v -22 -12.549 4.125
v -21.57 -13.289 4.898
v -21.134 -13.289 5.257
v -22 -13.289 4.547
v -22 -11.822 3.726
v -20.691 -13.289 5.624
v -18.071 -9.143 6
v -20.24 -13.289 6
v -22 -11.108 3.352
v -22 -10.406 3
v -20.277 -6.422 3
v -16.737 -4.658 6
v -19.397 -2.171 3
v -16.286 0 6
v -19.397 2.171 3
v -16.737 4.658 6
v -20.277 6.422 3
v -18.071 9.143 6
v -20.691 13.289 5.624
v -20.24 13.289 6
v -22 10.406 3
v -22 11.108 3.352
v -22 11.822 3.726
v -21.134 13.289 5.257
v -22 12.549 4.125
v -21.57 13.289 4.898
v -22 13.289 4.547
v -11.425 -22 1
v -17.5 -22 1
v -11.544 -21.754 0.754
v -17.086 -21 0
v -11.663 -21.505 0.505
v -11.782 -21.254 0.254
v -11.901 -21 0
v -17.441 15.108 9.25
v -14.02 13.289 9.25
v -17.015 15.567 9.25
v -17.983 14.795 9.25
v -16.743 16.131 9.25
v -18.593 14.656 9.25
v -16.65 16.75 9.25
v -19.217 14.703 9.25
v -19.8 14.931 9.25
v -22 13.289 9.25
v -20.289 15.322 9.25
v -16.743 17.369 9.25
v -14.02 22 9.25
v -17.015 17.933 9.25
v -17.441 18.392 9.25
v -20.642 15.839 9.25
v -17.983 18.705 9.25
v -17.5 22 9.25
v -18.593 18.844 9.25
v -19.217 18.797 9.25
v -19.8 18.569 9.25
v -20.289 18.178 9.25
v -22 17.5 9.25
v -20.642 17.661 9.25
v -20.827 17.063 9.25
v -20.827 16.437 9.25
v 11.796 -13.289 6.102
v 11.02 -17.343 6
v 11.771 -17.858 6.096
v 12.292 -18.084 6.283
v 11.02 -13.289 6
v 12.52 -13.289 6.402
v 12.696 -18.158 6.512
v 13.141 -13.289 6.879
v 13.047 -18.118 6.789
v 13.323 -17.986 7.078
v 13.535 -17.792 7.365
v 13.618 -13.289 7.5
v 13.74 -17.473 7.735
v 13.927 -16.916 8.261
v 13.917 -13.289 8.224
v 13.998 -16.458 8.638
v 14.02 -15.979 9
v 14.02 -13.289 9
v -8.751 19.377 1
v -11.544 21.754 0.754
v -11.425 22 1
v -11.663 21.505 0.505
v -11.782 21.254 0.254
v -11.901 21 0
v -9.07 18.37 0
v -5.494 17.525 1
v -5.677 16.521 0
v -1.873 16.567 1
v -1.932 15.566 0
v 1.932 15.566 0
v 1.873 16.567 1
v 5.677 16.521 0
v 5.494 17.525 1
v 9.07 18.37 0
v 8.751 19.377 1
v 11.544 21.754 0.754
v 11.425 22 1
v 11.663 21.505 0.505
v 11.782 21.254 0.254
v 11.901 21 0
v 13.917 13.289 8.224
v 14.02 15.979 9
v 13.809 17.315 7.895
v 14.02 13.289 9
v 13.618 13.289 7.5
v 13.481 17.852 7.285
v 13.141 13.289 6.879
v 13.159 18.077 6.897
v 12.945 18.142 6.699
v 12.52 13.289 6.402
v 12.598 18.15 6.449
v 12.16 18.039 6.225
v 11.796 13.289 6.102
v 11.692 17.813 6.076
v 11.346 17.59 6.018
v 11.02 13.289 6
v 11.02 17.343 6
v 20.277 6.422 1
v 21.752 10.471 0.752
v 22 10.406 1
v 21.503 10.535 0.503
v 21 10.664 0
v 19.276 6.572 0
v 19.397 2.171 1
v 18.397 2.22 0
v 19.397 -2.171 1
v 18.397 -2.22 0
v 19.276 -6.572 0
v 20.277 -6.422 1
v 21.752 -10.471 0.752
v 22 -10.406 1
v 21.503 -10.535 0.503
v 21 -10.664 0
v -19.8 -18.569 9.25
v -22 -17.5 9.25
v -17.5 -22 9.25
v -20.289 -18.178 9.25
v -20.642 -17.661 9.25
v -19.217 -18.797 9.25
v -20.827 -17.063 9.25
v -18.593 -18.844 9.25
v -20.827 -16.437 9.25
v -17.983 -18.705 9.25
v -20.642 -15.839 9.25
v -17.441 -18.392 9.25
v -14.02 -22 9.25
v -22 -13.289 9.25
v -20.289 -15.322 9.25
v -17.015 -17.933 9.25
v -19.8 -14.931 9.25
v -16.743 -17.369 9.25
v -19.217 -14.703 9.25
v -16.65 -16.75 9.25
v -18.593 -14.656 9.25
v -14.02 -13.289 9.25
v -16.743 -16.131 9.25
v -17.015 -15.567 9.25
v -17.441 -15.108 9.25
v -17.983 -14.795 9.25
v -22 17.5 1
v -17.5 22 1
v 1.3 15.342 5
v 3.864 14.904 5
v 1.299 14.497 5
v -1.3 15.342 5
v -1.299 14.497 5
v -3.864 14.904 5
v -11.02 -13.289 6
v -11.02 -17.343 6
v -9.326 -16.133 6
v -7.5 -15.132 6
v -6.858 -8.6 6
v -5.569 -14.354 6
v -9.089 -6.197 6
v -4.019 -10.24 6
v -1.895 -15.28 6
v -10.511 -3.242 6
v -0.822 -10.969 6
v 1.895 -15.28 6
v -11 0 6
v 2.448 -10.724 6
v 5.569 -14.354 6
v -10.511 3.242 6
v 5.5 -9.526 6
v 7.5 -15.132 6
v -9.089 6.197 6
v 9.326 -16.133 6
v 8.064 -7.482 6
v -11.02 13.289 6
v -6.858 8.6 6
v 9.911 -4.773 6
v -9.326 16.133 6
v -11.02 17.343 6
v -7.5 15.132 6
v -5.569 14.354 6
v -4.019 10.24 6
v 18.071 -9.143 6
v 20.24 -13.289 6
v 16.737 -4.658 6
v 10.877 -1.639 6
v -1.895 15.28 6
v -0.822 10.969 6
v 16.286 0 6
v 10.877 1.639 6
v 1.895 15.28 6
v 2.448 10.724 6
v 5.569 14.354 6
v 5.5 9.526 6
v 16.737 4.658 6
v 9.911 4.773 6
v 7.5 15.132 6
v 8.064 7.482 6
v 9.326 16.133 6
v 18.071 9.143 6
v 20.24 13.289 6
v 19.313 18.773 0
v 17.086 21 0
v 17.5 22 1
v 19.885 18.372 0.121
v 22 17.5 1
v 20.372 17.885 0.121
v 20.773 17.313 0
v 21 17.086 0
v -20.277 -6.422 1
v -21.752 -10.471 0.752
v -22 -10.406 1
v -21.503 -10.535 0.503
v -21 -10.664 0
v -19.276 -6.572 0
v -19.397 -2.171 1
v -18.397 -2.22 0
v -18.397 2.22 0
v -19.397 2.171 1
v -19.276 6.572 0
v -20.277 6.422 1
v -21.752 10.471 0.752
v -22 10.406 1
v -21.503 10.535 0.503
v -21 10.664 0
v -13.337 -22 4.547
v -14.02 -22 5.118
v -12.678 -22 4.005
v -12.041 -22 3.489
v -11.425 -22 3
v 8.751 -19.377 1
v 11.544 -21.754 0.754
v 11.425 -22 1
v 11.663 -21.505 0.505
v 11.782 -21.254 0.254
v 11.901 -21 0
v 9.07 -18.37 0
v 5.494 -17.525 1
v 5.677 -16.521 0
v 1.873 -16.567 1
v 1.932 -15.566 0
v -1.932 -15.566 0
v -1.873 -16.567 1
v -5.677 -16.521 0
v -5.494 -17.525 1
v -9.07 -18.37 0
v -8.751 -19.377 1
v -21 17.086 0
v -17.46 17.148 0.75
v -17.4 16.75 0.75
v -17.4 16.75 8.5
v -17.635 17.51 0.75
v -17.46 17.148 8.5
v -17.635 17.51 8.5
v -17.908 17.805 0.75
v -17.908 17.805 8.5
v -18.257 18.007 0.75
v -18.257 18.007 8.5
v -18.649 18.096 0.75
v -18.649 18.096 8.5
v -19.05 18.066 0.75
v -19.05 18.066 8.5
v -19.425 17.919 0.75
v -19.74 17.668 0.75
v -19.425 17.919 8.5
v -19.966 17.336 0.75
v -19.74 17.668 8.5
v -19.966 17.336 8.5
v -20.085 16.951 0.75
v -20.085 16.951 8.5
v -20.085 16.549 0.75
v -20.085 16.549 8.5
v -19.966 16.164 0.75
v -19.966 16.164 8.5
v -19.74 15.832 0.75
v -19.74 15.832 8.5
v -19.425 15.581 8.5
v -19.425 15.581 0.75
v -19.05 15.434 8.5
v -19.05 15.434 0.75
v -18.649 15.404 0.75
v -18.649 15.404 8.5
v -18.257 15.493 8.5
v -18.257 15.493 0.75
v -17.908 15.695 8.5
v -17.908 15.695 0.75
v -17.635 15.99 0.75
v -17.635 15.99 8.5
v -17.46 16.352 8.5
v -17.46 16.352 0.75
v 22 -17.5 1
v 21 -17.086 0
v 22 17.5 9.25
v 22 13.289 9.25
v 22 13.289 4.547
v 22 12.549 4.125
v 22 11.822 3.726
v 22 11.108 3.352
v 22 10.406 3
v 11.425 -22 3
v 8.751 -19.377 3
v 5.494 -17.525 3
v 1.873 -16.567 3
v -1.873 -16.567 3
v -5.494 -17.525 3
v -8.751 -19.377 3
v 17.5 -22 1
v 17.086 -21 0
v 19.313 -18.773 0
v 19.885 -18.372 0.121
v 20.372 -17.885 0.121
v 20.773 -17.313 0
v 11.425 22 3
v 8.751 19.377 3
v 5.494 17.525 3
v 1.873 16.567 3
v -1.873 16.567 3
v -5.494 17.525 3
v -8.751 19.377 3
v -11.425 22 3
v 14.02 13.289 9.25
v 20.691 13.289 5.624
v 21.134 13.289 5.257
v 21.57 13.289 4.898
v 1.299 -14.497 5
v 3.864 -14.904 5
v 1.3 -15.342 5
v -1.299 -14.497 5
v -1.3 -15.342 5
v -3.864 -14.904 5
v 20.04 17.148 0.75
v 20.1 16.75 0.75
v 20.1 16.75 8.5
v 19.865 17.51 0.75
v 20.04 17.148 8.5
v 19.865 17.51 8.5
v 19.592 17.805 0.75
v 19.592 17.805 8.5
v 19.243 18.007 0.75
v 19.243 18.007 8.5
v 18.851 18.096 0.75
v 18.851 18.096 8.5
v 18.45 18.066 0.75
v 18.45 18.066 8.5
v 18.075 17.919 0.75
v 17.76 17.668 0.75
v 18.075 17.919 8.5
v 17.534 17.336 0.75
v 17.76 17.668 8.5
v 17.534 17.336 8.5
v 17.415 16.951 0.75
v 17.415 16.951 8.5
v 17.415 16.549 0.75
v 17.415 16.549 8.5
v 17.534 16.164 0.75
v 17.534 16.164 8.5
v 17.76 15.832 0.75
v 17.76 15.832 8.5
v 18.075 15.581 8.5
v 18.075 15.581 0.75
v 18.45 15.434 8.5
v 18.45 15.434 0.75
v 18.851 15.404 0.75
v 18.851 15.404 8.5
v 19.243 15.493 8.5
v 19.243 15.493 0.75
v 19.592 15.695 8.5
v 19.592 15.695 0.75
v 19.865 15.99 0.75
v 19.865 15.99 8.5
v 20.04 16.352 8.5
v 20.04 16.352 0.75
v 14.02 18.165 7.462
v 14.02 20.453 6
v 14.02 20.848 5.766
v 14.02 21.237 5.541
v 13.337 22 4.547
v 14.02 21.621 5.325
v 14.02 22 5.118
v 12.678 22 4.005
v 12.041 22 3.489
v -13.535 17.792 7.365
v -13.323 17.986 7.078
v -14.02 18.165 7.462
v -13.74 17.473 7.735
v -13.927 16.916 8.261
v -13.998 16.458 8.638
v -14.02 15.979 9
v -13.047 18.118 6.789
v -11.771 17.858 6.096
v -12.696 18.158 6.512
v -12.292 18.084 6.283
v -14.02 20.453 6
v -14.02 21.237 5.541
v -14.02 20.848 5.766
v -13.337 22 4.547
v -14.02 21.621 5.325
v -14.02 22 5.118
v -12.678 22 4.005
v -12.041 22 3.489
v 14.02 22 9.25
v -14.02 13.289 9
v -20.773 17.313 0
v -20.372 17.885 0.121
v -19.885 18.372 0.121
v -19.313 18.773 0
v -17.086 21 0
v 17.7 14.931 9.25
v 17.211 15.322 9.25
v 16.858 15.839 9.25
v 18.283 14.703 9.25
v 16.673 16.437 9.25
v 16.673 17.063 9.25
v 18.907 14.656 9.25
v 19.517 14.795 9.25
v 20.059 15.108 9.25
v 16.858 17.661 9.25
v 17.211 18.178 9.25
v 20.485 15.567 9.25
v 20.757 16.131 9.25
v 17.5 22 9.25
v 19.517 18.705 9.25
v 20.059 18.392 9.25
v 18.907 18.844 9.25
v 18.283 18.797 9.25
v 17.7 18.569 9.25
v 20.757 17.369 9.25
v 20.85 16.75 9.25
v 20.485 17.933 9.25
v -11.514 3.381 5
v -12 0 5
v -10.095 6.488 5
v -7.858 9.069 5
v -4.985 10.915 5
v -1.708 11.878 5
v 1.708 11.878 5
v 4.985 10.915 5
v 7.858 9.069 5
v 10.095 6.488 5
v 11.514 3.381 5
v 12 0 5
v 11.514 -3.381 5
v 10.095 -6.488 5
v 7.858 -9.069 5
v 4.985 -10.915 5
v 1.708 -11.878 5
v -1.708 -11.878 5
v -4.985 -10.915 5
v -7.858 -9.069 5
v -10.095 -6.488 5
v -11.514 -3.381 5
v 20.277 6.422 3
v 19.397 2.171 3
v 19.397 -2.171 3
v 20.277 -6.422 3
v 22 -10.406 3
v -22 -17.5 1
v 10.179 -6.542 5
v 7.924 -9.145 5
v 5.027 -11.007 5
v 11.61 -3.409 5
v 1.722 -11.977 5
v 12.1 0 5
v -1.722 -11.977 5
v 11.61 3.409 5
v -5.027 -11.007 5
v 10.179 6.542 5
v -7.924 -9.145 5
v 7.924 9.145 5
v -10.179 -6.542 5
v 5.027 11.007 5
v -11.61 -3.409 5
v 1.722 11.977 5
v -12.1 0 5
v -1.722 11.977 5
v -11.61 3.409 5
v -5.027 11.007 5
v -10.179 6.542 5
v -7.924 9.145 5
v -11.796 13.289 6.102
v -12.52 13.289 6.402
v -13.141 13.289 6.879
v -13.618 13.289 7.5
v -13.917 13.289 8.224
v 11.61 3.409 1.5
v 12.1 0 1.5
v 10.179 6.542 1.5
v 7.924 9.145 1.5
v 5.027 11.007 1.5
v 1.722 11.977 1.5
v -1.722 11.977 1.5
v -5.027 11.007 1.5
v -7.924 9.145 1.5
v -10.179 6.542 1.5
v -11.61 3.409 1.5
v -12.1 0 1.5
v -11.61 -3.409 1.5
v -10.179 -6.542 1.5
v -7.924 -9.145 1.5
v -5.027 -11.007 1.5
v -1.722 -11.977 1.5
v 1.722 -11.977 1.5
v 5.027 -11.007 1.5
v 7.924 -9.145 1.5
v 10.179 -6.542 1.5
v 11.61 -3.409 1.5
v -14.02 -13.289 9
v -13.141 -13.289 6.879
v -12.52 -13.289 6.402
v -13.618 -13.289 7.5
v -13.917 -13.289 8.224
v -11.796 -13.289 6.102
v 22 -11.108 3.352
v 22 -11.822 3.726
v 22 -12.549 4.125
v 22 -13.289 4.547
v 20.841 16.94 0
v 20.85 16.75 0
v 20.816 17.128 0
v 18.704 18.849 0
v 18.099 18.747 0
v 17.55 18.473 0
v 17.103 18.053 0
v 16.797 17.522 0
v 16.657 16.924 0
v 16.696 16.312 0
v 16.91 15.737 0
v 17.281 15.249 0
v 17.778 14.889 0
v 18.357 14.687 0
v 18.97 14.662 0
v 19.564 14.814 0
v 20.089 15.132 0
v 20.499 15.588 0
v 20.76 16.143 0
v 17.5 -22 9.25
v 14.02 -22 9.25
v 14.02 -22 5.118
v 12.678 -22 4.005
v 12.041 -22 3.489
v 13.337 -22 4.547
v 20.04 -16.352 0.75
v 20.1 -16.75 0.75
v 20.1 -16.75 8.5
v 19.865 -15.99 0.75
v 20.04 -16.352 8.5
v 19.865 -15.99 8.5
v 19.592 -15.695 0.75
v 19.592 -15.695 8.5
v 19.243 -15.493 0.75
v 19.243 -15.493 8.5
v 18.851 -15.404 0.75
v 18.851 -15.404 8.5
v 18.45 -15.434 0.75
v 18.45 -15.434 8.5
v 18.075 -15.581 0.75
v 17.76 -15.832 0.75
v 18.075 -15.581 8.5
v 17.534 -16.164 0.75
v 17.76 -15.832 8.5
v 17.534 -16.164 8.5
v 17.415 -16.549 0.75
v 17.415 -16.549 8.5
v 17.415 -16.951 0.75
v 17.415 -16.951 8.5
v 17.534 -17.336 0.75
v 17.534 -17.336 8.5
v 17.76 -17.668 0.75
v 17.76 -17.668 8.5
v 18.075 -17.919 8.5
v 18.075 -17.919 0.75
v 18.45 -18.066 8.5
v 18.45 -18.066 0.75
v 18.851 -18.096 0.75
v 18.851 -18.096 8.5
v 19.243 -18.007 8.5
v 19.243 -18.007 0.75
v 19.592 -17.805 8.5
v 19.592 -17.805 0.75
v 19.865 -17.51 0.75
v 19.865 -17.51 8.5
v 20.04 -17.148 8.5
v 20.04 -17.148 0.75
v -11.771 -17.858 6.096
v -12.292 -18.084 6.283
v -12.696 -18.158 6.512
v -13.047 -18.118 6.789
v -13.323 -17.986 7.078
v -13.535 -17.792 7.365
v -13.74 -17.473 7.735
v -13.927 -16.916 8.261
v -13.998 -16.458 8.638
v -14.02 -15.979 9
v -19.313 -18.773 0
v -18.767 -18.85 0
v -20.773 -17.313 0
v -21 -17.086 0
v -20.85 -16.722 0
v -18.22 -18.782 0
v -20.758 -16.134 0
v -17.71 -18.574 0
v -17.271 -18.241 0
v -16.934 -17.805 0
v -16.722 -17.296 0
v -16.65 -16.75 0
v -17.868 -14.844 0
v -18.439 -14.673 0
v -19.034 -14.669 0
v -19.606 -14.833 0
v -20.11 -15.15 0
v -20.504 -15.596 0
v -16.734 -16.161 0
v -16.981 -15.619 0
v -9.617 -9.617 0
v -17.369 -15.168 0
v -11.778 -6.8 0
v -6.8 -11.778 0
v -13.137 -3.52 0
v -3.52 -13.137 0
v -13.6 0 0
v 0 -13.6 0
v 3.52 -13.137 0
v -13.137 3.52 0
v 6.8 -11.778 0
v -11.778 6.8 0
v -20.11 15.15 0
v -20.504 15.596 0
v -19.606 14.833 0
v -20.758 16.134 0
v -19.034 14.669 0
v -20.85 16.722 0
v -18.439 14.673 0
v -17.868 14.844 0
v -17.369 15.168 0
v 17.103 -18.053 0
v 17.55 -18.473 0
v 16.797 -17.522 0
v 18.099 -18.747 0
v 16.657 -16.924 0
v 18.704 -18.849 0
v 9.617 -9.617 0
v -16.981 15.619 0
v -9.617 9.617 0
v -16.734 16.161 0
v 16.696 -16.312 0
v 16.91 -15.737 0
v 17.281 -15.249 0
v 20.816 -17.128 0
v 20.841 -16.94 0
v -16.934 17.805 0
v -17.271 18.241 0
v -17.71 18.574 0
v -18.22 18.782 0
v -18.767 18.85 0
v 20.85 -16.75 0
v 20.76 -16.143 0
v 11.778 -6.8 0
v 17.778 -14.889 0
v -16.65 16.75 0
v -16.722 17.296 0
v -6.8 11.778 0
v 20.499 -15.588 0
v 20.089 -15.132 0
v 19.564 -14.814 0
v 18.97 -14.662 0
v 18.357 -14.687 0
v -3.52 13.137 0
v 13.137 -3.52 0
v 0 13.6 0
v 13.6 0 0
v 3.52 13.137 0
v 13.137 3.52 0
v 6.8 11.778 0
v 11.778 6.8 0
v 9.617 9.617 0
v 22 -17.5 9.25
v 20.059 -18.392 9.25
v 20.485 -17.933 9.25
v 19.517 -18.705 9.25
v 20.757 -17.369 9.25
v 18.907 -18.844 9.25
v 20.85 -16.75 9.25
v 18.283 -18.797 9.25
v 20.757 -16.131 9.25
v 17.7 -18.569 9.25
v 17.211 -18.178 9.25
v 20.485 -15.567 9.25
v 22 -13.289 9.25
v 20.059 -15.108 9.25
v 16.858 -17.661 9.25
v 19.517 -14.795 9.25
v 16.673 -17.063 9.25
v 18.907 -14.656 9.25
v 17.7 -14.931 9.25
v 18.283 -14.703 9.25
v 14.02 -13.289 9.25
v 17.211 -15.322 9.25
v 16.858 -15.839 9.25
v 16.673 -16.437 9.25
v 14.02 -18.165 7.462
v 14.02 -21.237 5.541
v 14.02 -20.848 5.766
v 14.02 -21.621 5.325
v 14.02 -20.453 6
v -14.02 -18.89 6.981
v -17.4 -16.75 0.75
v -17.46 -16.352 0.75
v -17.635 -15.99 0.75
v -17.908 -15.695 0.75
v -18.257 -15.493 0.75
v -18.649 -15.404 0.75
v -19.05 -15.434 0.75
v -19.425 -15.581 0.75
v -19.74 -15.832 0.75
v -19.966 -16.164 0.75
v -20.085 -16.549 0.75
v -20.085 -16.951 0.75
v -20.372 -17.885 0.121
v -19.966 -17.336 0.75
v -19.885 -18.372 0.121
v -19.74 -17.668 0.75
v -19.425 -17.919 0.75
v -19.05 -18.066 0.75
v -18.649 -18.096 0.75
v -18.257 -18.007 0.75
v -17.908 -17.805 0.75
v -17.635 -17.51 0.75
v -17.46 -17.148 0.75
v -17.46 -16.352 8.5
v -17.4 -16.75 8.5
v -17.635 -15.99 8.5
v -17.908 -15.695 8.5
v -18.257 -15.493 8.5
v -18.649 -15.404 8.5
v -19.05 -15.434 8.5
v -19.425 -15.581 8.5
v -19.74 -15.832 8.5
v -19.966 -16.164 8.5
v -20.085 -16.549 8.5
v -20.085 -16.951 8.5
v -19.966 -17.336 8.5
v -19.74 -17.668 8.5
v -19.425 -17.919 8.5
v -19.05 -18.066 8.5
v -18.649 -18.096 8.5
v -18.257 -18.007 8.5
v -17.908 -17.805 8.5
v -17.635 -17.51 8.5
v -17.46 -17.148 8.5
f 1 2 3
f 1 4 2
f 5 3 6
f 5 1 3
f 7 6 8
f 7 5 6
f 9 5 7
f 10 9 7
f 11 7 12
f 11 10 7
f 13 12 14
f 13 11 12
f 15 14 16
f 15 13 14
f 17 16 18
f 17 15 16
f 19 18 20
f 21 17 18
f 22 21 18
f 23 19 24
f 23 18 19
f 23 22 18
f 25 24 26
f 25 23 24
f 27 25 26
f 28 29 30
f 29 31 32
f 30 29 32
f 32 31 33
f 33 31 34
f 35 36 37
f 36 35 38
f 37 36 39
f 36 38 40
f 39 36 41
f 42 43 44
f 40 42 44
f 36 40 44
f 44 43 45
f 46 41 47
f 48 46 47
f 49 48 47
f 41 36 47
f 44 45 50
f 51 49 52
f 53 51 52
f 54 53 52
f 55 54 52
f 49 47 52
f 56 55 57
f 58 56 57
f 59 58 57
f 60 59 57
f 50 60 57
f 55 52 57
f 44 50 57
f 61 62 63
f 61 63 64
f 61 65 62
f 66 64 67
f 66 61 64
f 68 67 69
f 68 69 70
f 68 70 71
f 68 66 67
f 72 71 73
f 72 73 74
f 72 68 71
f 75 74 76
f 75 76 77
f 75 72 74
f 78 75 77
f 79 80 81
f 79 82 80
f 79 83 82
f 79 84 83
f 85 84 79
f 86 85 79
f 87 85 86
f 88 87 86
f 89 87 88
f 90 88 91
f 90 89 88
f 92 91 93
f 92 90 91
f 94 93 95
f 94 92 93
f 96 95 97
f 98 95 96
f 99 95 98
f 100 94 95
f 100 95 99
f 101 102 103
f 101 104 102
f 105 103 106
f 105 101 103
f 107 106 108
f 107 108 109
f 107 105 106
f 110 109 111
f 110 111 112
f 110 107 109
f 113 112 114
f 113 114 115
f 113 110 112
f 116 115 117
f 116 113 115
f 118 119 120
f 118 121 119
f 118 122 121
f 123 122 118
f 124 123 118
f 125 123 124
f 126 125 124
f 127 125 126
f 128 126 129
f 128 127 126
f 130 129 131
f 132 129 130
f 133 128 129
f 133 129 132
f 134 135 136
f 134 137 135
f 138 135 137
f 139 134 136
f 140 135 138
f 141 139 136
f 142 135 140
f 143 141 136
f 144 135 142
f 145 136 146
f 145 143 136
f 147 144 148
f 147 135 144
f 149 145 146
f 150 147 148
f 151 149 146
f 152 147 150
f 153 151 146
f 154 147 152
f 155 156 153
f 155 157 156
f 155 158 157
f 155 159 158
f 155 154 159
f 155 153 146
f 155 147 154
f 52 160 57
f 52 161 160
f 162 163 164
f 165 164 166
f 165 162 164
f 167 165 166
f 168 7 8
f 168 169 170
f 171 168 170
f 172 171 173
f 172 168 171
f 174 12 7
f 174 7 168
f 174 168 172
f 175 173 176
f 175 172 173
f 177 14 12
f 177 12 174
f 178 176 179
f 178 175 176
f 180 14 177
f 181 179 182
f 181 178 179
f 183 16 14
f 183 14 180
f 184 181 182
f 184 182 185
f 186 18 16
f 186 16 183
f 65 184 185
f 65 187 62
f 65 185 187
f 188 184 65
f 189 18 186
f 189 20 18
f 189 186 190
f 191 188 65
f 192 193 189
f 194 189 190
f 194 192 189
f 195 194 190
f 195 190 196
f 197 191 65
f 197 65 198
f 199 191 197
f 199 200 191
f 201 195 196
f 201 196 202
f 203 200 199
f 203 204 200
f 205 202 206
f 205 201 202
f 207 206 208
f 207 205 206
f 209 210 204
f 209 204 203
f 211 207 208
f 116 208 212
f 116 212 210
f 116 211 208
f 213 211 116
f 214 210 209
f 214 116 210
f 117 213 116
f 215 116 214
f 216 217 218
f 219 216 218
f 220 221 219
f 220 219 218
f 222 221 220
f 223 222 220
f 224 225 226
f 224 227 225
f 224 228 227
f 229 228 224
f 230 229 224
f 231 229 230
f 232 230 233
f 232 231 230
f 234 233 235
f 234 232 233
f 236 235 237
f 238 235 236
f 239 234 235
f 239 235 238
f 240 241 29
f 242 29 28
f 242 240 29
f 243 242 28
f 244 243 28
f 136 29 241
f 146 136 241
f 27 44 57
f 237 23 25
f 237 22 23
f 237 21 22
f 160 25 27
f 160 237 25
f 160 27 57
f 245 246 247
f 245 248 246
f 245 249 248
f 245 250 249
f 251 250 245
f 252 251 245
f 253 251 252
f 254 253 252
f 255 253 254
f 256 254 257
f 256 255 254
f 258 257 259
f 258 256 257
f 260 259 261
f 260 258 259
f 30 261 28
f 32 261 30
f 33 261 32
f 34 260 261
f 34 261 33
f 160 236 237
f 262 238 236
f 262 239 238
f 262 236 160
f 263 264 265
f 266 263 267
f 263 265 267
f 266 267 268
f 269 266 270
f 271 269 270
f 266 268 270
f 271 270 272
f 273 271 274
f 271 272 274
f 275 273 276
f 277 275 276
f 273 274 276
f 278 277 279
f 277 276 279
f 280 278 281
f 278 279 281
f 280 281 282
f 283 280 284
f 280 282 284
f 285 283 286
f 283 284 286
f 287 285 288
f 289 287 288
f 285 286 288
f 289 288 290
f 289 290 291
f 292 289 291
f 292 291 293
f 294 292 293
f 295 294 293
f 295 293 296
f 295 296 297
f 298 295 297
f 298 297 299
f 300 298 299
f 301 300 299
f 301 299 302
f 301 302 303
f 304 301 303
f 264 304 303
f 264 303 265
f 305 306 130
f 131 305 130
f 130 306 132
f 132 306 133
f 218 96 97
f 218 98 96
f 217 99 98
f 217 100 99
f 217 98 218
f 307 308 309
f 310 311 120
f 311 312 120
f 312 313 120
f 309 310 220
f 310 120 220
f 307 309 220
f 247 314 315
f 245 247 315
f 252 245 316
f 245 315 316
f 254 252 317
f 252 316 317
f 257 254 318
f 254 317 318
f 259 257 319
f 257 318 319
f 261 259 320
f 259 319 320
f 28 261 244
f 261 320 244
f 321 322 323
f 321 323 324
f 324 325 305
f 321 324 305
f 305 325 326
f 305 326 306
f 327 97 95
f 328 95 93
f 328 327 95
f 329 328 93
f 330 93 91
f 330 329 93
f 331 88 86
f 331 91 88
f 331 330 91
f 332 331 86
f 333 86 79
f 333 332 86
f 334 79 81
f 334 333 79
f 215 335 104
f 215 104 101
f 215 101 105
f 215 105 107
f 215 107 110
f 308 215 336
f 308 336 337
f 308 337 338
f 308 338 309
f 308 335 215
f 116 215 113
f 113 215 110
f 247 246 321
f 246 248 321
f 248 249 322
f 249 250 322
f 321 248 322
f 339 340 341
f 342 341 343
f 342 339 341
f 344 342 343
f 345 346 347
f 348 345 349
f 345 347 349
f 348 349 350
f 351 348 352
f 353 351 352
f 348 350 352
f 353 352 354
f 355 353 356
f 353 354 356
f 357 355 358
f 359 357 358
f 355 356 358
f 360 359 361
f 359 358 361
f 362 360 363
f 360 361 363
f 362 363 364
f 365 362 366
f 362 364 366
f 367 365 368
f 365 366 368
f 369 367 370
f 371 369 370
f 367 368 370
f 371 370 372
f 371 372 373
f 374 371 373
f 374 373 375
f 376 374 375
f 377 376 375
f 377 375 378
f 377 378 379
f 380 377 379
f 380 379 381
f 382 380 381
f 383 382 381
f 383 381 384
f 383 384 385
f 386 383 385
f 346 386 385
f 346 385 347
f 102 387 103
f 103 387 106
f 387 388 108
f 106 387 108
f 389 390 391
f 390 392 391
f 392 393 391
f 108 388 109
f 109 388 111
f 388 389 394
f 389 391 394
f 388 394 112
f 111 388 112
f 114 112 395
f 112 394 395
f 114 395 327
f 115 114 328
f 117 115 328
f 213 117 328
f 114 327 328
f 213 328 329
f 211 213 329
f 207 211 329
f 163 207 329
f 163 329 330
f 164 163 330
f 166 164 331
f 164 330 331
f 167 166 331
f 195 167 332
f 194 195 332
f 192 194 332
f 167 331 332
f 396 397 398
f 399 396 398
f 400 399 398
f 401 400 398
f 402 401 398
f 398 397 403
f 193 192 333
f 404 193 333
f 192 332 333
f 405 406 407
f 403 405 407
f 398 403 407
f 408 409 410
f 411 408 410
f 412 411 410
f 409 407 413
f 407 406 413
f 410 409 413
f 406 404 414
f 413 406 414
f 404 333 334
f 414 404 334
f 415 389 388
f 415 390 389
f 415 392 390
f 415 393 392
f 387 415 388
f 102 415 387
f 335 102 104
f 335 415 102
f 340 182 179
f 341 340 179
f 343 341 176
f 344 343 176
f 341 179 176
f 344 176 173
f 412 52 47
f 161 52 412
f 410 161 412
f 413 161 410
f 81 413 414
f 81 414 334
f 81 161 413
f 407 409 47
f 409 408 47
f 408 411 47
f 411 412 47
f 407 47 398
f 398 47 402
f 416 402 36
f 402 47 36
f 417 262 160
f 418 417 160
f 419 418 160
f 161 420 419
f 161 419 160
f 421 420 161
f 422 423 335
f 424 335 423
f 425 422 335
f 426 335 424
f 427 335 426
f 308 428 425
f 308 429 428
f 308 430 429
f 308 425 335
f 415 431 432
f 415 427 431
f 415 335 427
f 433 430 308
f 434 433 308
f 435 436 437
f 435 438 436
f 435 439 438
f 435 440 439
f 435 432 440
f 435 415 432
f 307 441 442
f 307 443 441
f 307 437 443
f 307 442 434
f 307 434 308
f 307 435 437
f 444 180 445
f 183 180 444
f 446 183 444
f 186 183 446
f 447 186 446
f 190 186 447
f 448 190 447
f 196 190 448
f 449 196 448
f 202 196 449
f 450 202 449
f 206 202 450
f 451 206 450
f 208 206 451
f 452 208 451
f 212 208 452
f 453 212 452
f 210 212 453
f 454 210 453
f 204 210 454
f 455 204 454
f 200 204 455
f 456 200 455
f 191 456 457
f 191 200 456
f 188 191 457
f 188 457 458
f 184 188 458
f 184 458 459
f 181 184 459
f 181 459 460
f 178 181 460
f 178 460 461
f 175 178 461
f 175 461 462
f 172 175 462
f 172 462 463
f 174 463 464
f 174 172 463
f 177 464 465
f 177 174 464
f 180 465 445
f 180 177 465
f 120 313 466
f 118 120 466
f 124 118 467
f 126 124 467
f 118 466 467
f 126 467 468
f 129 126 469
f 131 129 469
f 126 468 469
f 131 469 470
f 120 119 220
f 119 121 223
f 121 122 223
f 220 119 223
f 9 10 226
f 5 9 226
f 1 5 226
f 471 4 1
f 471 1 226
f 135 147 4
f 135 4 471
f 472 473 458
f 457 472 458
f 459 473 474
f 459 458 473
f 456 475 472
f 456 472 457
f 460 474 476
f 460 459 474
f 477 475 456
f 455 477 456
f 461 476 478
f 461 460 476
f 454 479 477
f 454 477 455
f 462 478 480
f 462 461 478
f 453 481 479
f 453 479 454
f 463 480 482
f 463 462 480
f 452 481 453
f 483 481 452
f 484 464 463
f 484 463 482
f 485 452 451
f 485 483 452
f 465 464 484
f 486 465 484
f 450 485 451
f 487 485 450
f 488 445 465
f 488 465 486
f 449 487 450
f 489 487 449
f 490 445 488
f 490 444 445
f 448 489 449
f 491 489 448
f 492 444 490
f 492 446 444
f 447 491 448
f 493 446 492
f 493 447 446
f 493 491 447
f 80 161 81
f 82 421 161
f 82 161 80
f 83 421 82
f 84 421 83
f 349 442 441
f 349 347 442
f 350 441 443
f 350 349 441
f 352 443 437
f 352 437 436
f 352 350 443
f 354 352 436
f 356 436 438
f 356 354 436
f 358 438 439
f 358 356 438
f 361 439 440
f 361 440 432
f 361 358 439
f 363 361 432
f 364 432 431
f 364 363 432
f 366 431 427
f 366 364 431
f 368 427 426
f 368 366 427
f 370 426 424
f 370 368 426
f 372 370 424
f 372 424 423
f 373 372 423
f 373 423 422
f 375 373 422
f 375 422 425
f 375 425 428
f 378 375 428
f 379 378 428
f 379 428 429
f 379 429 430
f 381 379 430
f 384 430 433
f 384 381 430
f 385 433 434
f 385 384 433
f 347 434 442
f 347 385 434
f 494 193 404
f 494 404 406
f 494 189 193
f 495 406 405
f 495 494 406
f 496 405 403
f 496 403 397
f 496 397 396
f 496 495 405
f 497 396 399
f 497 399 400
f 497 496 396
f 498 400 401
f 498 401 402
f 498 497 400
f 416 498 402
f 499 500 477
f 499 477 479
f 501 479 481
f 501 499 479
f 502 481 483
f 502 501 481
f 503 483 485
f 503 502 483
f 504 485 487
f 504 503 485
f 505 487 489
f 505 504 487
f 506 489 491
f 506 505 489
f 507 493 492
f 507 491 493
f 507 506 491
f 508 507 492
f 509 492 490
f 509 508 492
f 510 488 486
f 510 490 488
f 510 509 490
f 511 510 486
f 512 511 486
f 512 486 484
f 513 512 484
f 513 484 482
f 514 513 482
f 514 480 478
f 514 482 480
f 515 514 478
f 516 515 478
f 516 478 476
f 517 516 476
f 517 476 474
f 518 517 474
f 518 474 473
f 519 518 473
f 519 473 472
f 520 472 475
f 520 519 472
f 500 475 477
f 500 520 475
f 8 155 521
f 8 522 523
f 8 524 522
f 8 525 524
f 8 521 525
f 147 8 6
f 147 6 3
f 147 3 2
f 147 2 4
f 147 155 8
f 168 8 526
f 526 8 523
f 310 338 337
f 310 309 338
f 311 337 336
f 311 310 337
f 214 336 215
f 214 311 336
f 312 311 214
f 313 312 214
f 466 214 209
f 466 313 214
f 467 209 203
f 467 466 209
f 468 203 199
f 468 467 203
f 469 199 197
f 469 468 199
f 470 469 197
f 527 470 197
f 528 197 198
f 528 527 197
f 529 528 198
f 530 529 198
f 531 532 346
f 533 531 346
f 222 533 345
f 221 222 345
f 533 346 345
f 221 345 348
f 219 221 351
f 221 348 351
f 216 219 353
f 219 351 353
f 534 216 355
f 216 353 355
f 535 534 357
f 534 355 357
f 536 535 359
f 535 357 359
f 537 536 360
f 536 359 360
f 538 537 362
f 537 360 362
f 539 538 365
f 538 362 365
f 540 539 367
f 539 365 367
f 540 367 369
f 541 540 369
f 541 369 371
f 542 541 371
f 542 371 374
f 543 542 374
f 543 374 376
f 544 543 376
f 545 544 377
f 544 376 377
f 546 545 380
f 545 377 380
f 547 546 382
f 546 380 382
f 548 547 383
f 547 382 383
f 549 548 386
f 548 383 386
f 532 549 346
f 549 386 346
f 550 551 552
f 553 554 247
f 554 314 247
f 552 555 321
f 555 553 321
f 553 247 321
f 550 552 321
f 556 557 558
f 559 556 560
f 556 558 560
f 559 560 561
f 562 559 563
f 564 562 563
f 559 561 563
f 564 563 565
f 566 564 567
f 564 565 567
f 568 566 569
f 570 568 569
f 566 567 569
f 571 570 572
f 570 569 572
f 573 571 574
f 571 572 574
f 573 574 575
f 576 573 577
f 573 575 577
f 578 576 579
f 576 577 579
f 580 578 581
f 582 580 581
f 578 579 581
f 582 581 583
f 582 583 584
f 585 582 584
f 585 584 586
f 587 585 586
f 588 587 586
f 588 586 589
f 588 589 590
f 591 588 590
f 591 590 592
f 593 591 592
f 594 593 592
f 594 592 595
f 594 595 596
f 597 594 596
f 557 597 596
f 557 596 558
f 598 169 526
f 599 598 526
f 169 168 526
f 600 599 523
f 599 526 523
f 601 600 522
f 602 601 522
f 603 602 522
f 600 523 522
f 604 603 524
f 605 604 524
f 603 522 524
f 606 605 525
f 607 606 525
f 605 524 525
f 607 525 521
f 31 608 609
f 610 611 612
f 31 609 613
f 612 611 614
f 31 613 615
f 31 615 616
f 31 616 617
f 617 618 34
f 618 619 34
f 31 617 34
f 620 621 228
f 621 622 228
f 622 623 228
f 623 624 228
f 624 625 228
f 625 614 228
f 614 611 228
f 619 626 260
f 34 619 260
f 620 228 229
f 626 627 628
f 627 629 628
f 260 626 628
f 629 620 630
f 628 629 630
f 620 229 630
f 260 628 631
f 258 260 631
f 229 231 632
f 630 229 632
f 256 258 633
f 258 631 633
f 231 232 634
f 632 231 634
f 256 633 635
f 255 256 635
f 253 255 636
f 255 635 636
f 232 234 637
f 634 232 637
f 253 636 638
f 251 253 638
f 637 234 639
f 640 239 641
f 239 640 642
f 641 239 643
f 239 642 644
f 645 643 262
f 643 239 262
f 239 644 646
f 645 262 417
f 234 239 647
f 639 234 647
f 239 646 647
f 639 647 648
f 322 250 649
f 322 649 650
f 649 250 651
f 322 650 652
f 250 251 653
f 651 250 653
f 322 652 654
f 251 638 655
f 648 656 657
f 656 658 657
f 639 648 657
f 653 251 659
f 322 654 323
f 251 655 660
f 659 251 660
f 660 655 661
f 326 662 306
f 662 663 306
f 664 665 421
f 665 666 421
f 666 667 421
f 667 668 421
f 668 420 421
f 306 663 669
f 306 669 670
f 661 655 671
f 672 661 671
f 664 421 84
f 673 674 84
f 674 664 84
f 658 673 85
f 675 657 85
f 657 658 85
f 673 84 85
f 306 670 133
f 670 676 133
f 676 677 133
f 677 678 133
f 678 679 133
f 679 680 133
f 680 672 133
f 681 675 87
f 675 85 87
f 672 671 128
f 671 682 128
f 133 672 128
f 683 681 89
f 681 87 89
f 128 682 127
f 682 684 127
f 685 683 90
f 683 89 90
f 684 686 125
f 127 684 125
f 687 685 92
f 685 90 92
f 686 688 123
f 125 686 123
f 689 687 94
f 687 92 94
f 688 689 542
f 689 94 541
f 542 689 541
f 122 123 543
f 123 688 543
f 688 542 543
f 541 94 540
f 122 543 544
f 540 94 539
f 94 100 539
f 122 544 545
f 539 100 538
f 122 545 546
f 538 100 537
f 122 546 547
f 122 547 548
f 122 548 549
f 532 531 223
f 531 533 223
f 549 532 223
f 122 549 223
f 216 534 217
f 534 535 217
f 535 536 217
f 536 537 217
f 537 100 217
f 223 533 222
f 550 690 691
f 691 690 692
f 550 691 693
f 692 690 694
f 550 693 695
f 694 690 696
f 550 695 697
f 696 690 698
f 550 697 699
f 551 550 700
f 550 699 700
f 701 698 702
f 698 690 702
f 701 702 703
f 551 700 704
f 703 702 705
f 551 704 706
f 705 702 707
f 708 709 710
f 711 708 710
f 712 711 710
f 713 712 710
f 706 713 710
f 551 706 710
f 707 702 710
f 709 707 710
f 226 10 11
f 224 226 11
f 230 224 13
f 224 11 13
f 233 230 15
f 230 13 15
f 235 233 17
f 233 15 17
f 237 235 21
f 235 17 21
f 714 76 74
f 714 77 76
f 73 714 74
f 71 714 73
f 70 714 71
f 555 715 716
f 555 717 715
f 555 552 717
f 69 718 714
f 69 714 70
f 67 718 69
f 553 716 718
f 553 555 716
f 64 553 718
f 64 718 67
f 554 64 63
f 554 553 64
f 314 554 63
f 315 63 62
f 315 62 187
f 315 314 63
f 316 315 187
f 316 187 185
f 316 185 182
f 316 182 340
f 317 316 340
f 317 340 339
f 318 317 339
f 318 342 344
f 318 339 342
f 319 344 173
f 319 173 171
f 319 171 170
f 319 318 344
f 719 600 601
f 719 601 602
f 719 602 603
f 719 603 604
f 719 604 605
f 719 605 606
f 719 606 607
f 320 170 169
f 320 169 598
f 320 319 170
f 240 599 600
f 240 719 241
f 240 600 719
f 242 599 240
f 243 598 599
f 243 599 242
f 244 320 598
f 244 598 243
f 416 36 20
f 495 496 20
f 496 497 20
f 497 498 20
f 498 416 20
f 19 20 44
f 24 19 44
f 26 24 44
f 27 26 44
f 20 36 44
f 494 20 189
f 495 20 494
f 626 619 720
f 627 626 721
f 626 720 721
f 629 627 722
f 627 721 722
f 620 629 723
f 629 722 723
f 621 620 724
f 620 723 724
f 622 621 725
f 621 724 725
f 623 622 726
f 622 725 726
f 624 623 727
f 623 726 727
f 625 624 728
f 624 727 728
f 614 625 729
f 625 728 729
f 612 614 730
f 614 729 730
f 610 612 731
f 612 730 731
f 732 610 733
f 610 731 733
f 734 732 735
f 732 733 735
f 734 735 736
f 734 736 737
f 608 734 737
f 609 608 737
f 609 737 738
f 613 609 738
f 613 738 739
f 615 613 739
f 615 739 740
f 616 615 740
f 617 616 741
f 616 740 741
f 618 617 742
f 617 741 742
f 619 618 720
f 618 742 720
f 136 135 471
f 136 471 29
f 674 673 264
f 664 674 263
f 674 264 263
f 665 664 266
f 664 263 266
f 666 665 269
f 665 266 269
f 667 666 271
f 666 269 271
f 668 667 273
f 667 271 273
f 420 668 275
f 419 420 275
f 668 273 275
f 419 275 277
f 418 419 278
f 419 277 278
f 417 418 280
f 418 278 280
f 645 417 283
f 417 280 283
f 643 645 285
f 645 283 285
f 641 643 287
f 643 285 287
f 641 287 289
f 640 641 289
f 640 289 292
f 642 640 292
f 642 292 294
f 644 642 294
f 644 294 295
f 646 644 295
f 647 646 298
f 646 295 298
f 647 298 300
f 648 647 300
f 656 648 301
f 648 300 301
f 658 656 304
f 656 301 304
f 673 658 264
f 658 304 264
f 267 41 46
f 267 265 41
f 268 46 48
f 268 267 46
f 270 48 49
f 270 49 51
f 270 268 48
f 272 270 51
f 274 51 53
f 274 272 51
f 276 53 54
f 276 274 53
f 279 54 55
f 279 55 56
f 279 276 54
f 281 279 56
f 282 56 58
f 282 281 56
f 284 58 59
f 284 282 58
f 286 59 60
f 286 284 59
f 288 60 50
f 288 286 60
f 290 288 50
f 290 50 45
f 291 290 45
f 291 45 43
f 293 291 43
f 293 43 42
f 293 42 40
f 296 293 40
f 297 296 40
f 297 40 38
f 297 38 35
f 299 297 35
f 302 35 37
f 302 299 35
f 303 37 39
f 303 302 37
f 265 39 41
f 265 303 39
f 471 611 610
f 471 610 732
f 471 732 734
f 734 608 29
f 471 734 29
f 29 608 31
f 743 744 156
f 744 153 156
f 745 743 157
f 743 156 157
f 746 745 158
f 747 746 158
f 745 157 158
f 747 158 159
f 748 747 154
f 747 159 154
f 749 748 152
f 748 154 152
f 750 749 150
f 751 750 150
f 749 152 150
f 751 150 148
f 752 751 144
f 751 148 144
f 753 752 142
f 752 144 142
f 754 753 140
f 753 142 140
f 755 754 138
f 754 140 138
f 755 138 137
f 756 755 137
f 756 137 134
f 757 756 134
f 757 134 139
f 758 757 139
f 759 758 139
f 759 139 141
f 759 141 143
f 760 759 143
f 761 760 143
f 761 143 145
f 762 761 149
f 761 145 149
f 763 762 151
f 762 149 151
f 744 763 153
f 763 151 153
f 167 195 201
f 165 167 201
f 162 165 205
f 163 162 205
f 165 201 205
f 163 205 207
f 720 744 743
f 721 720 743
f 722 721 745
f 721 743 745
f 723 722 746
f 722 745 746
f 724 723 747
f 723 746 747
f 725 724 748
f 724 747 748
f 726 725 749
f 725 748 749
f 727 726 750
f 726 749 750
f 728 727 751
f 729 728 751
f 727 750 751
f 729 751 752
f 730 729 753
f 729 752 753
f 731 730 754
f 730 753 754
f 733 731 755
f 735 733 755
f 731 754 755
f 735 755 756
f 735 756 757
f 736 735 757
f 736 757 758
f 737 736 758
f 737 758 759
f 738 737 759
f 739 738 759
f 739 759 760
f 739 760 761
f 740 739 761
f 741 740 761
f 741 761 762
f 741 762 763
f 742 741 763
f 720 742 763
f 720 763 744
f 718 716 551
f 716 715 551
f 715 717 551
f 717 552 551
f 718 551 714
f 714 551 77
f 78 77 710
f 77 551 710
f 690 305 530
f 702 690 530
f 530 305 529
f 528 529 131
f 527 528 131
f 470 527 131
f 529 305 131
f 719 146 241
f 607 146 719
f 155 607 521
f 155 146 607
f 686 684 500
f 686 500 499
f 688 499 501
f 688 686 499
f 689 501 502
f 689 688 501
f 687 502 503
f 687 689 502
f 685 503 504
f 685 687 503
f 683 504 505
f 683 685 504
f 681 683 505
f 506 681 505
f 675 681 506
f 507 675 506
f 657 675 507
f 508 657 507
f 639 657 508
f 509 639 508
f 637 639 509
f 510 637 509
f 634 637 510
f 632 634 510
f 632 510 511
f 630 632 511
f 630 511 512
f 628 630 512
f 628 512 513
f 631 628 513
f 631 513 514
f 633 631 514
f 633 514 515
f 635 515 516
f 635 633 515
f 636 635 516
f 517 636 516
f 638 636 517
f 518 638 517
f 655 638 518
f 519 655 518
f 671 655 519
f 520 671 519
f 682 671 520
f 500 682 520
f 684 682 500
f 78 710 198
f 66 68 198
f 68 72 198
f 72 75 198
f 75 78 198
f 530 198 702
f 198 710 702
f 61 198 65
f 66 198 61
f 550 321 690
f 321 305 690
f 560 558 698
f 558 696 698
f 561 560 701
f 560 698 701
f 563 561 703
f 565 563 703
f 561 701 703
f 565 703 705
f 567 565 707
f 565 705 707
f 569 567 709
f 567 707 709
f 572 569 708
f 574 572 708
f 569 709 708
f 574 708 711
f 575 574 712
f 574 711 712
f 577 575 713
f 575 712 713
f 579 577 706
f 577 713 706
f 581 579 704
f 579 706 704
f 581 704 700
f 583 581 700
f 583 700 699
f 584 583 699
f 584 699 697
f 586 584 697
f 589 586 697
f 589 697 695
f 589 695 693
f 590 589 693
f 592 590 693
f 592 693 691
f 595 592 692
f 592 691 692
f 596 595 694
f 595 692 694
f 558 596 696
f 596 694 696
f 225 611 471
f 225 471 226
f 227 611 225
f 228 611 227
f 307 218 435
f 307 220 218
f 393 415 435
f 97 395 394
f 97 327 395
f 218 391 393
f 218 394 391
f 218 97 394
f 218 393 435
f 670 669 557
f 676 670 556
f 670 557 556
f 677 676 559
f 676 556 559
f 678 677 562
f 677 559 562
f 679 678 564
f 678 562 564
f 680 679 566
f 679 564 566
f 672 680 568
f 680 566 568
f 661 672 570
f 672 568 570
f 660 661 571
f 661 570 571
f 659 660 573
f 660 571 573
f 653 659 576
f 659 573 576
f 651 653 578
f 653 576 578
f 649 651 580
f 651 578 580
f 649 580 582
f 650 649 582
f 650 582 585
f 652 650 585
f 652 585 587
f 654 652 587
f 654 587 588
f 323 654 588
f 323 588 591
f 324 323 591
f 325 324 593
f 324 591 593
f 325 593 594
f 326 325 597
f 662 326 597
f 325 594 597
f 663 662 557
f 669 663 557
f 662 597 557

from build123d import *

# Parameters (mm, degrees)
CROQUIS1_W              = 44
CROQUIS1_H              = 44
CROQUIS1_R              = 12.1
SALIENTE_EXTRUIR1_DEPTH = 6
CHAFL_N2_SIZE           = 4.5
CROQUIS2_R              = 1.35
CORTAR_EXTRUIR1_DEPTH   = 32.685959036
CROQUIS3_R              = 21.308128052
CORTAR_EXTRUIR2_DEPTH   = 32.685959036
CHAFL_N4_SIZE           = 1
SALIENTE_EXTRUIR2_START = 3.25
CROQUIS4_R              = 1.35
SALIENTE_EXTRUIR2_DEPTH = 3.25
CHAFL_N5_SIZE           = 3
CHAFL_N3_SIZE           = 0.75
REDONDEO1_R             = 3
CROQUIS5_R              = 15.396724601
CROQUIS5_R_2            = 11
SALIENTE_EXTRUIR4_DEPTH = 1
CHAFL_N6_SIZE           = 1.5
CHAFL_N7_SIZE           = 1


# Some blends are built 0.0001 mm under size
with BuildPart() as part:
    # Croquis1 → Saliente-Extruir1 (new body)
    with BuildSketch(Plane.XY):
        Rectangle(CROQUIS1_W, CROQUIS1_H)
        Circle(CROQUIS1_R, mode=Mode.SUBTRACT)
    extrude(amount=SALIENTE_EXTRUIR1_DEPTH)

    # Chaflán2
    chafl_n2_edges = [part.edges().sort_by_distance(p)[0] for p in [
        (-22, 22, 3),
        (22, 22, 3),
        (22, -22, 3),
        (-22, -22, 3),
    ]]
    chamfer(chafl_n2_edges, length=CHAFL_N2_SIZE)

    # Croquis2 → Cortar-Extruir1 (cut, through all)
    with BuildSketch(Plane.XY.offset(6)):
        with Locations((-18.75, -16.75)):
            Circle(CROQUIS2_R)
        with Locations((18.75, -16.75)):
            Circle(CROQUIS2_R)
        with Locations((18.75, 16.75)):
            Circle(CROQUIS2_R)
        with Locations((-18.75, 16.75)):
            Circle(CROQUIS2_R)
    extrude(amount=-CORTAR_EXTRUIR1_DEPTH, mode=Mode.SUBTRACT)

    # Croquis3 → Cortar-Extruir2 (cut, through all)
    with BuildSketch(Plane.XY.offset(6)):
        with Locations((40.594273769, 0)):
            Circle(CROQUIS3_R)
        with Locations((-40.594273769, 0)):
            Circle(CROQUIS3_R)
        with BuildLine():
            Line((14.527768994, 48.750256971), (14.527768994, 30.973585325))
            ThreePointArc((14.527768994, 30.973585325), (0, 16.445816331), (-14.527768994, 30.973585325))
            Line((-14.527768994, 30.973585325), (-14.527768994, 48.750256971))
            ThreePointArc((-14.527768994, 48.750256971), (0, 63.278025965), (14.527768994, 48.750256971))
        make_face()
        with BuildLine():
            Line((14.527768994, -48.750256971), (14.527768994, -30.973585325))
            ThreePointArc((14.527768994, -30.973585325), (0, -16.445816331), (-14.527768994, -30.973585325))
            Line((-14.527768994, -30.973585325), (-14.527768994, -48.750256971))
            ThreePointArc((-14.527768994, -48.750256971), (0, -63.278025965), (14.527768994, -48.750256971))
        make_face()
    extrude(amount=-CORTAR_EXTRUIR2_DEPTH, mode=Mode.SUBTRACT)

    # Chaflán4
    chafl_n4_edges = [part.edges().sort_by_distance(p)[0] for p in [
        (-22, 13.953107343, 0),
        (14.462504669, 22, 0),
        (22, -13.953107343, 0),
        (-14.462504669, -22, 0),
        (19.75, -19.75, 0),
        (-19.75, -19.75, 0),
        (19.75, 19.75, 0),
        (-19.75, 19.75, 0),
        (-14.462504669, 22, 0),
        (22, 13.953107343, 0),
        (14.462504669, -22, 0),
        (-22, -13.953107343, 0),
        (19.286145717, 0, 0),
        (0, -16.445816331, 0),
        (0, 16.445816331, 0),
        (-19.286145717, 0, 0),
    ]]
    chamfer(chafl_n4_edges, length=CHAFL_N4_SIZE)

    # Croquis4 → Saliente-Extruir2 (add)
    # profile 1 of 4: a face of its own
    with BuildSketch(Plane.XY.offset(6).offset(SALIENTE_EXTRUIR2_START)):
        Polygon((-22, -17.5), (-17.5, -22), (-14.019564426, -22), (-14.019564426, -13.289292173), (-22, -13.289292173), align=None)
        with Locations((-18.75, -16.75)):
            Circle(CROQUIS4_R, mode=Mode.SUBTRACT)
    # profile 2 of 4: a face of its own
    with BuildSketch(Plane.XY.offset(6).offset(SALIENTE_EXTRUIR2_START)):
        Polygon((22, -13.289292173), (22, -17.5), (17.5, -22), (14.019564426, -22), (14.019564426, -13.289292173), align=None)
        with Locations((18.75, -16.75)):
            Circle(CROQUIS4_R, mode=Mode.SUBTRACT)
    # profile 3 of 4: a face of its own
    with BuildSketch(Plane.XY.offset(6).offset(SALIENTE_EXTRUIR2_START)):
        Polygon((22, 17.5), (17.5, 22), (14.019564426, 22), (14.019564426, 13.289292173), (22, 13.289292173), align=None)
        with Locations((18.75, 16.75)):
            Circle(CROQUIS4_R, mode=Mode.SUBTRACT)
    # profile 4 of 4: a face of its own
    with BuildSketch(Plane.XY.offset(6).offset(SALIENTE_EXTRUIR2_START)):
        Polygon((-22, 13.289292173), (-22, 17.5), (-17.5, 22), (-14.019564426, 22), (-14.019564426, 13.289292173), align=None)
        with Locations((-18.75, 16.75)):
            Circle(CROQUIS4_R, mode=Mode.SUBTRACT)
    extrude(amount=-SALIENTE_EXTRUIR2_DEPTH)

    # Chaflán5
    chafl_n5_edges = [part.edges().sort_by_distance(p)[0] for p in [
        (-19.286145717, 0, 6),
        (19.286145717, 0, 6),
        (0, -16.445816331, 6),
        (0, 16.445816331, 6),
    ]]
    chamfer(chafl_n5_edges, length=CHAFL_N5_SIZE)

    # Chaflán3
    # the kernel refuses this chamfer: 0.75 mm, written as the material it takes off along each edge
    with BuildSketch(Plane(origin=(-18.75, -16.75, 9.25), x_dir=(1, 0, 0), z_dir=(0, -1, 0))) as chafl_n3_piece_1:
        Polygon((1.35, -CHAFL_N3_SIZE), (1.35 + CHAFL_N3_SIZE, 0), (1.35, 0), align=None)
    revolve(axis=Axis((-18.75, -16.75, 9.25), (0, 0, 1)), mode=Mode.SUBTRACT)
    with BuildSketch(Plane(origin=(18.75, -16.75, 9.25), x_dir=(1, 0, 0), z_dir=(0, -1, 0))) as chafl_n3_piece_2:
        Polygon((1.35, -CHAFL_N3_SIZE), (1.35 + CHAFL_N3_SIZE, 0), (1.35, 0), align=None)
    revolve(axis=Axis((18.75, -16.75, 9.25), (0, 0, 1)), mode=Mode.SUBTRACT)
    with BuildSketch(Plane(origin=(18.75, 16.75, 9.25), x_dir=(1, 0, 0), z_dir=(0, -1, 0))) as chafl_n3_piece_3:
        Polygon((1.35 + CHAFL_N3_SIZE, 0), (1.35, -CHAFL_N3_SIZE), (1.35, 0), align=None)
    revolve(axis=Axis((18.75, 16.75, 9.25), (0, 0, 1)), mode=Mode.SUBTRACT)
    with BuildSketch(Plane(origin=(-18.75, 16.75, 9.25), x_dir=(1, 0, 0), z_dir=(0, -1, 0))) as chafl_n3_piece_4:
        Polygon((1.35 + CHAFL_N3_SIZE, 0), (1.35, -CHAFL_N3_SIZE), (1.35, 0), align=None)
    revolve(axis=Axis((-18.75, 16.75, 9.25), (0, 0, 1)), mode=Mode.SUBTRACT)
    with BuildSketch(Plane(origin=(-18.75, 16.75, 0), x_dir=(1, 0, 0), z_dir=(0, -1, 0))) as chafl_n3_piece_5:
        Polygon((1.35 + CHAFL_N3_SIZE, 0), (1.35, CHAFL_N3_SIZE), (1.35, 0), align=None)
    revolve(axis=Axis((-18.75, 16.75, 0), (0, 0, 1)), mode=Mode.SUBTRACT)
    with BuildSketch(Plane(origin=(18.75, 16.75, 0), x_dir=(1, 0, 0), z_dir=(0, -1, 0))) as chafl_n3_piece_6:
        Polygon((1.35 + CHAFL_N3_SIZE, 0), (1.35, CHAFL_N3_SIZE), (1.35, 0), align=None)
    revolve(axis=Axis((18.75, 16.75, 0), (0, 0, 1)), mode=Mode.SUBTRACT)
    with BuildSketch(Plane(origin=(18.75, -16.75, 0), x_dir=(1, 0, 0), z_dir=(0, -1, 0))) as chafl_n3_piece_7:
        Polygon((1.35 + CHAFL_N3_SIZE, 0), (1.35, CHAFL_N3_SIZE), (1.35, 0), align=None)
    revolve(axis=Axis((18.75, -16.75, 0), (0, 0, 1)), mode=Mode.SUBTRACT)
    with BuildSketch(Plane(origin=(-18.75, -16.75, 0), x_dir=(1, 0, 0), z_dir=(0, -1, 0))) as chafl_n3_piece_8:
        Polygon((1.35 + CHAFL_N3_SIZE, 0), (1.35, CHAFL_N3_SIZE), (1.35, 0), align=None)
    revolve(axis=Axis((-18.75, -16.75, 0), (0, 0, 1)), mode=Mode.SUBTRACT)

    # Redondeo1
    redondeo1_edges = [part.edges().sort_by_distance(p)[0] for p in [
        (14.019564426, -16.871341335, 6),
        (-14.019564426, 16.871341335, 6),
        (-14.019564426, -16.871341335, 6),
        (14.019564426, 16.871341335, 6),
    ]]
    fillet(redondeo1_edges, radius=REDONDEO1_R)

    # Croquis5 → Saliente-Extruir4 (add)
    with BuildSketch(Plane(origin=(0, 0, 6), x_dir=(-1, 0, 0), z_dir=(0, 0, -1))):
        Circle(CROQUIS5_R)
        Circle(CROQUIS5_R_2, mode=Mode.SUBTRACT)
    extrude(amount=SALIENTE_EXTRUIR4_DEPTH)

    # Chaflán6
    chafl_n6_edges = [part.edges().sort_by_distance(p)[0] for p in [
        (-12.1, 0, 0),
    ]]
    chamfer(chafl_n6_edges, length=CHAFL_N6_SIZE)

    # Chaflán7
    chafl_n7_edges = [part.edges().sort_by_distance(p)[0] for p in [
        (11, 0, 5),
    ]]
    chamfer(chafl_n7_edges, length=CHAFL_N7_SIZE - 0.0001)  # a hair under: the kernel refuses the full size


solid = part.part
